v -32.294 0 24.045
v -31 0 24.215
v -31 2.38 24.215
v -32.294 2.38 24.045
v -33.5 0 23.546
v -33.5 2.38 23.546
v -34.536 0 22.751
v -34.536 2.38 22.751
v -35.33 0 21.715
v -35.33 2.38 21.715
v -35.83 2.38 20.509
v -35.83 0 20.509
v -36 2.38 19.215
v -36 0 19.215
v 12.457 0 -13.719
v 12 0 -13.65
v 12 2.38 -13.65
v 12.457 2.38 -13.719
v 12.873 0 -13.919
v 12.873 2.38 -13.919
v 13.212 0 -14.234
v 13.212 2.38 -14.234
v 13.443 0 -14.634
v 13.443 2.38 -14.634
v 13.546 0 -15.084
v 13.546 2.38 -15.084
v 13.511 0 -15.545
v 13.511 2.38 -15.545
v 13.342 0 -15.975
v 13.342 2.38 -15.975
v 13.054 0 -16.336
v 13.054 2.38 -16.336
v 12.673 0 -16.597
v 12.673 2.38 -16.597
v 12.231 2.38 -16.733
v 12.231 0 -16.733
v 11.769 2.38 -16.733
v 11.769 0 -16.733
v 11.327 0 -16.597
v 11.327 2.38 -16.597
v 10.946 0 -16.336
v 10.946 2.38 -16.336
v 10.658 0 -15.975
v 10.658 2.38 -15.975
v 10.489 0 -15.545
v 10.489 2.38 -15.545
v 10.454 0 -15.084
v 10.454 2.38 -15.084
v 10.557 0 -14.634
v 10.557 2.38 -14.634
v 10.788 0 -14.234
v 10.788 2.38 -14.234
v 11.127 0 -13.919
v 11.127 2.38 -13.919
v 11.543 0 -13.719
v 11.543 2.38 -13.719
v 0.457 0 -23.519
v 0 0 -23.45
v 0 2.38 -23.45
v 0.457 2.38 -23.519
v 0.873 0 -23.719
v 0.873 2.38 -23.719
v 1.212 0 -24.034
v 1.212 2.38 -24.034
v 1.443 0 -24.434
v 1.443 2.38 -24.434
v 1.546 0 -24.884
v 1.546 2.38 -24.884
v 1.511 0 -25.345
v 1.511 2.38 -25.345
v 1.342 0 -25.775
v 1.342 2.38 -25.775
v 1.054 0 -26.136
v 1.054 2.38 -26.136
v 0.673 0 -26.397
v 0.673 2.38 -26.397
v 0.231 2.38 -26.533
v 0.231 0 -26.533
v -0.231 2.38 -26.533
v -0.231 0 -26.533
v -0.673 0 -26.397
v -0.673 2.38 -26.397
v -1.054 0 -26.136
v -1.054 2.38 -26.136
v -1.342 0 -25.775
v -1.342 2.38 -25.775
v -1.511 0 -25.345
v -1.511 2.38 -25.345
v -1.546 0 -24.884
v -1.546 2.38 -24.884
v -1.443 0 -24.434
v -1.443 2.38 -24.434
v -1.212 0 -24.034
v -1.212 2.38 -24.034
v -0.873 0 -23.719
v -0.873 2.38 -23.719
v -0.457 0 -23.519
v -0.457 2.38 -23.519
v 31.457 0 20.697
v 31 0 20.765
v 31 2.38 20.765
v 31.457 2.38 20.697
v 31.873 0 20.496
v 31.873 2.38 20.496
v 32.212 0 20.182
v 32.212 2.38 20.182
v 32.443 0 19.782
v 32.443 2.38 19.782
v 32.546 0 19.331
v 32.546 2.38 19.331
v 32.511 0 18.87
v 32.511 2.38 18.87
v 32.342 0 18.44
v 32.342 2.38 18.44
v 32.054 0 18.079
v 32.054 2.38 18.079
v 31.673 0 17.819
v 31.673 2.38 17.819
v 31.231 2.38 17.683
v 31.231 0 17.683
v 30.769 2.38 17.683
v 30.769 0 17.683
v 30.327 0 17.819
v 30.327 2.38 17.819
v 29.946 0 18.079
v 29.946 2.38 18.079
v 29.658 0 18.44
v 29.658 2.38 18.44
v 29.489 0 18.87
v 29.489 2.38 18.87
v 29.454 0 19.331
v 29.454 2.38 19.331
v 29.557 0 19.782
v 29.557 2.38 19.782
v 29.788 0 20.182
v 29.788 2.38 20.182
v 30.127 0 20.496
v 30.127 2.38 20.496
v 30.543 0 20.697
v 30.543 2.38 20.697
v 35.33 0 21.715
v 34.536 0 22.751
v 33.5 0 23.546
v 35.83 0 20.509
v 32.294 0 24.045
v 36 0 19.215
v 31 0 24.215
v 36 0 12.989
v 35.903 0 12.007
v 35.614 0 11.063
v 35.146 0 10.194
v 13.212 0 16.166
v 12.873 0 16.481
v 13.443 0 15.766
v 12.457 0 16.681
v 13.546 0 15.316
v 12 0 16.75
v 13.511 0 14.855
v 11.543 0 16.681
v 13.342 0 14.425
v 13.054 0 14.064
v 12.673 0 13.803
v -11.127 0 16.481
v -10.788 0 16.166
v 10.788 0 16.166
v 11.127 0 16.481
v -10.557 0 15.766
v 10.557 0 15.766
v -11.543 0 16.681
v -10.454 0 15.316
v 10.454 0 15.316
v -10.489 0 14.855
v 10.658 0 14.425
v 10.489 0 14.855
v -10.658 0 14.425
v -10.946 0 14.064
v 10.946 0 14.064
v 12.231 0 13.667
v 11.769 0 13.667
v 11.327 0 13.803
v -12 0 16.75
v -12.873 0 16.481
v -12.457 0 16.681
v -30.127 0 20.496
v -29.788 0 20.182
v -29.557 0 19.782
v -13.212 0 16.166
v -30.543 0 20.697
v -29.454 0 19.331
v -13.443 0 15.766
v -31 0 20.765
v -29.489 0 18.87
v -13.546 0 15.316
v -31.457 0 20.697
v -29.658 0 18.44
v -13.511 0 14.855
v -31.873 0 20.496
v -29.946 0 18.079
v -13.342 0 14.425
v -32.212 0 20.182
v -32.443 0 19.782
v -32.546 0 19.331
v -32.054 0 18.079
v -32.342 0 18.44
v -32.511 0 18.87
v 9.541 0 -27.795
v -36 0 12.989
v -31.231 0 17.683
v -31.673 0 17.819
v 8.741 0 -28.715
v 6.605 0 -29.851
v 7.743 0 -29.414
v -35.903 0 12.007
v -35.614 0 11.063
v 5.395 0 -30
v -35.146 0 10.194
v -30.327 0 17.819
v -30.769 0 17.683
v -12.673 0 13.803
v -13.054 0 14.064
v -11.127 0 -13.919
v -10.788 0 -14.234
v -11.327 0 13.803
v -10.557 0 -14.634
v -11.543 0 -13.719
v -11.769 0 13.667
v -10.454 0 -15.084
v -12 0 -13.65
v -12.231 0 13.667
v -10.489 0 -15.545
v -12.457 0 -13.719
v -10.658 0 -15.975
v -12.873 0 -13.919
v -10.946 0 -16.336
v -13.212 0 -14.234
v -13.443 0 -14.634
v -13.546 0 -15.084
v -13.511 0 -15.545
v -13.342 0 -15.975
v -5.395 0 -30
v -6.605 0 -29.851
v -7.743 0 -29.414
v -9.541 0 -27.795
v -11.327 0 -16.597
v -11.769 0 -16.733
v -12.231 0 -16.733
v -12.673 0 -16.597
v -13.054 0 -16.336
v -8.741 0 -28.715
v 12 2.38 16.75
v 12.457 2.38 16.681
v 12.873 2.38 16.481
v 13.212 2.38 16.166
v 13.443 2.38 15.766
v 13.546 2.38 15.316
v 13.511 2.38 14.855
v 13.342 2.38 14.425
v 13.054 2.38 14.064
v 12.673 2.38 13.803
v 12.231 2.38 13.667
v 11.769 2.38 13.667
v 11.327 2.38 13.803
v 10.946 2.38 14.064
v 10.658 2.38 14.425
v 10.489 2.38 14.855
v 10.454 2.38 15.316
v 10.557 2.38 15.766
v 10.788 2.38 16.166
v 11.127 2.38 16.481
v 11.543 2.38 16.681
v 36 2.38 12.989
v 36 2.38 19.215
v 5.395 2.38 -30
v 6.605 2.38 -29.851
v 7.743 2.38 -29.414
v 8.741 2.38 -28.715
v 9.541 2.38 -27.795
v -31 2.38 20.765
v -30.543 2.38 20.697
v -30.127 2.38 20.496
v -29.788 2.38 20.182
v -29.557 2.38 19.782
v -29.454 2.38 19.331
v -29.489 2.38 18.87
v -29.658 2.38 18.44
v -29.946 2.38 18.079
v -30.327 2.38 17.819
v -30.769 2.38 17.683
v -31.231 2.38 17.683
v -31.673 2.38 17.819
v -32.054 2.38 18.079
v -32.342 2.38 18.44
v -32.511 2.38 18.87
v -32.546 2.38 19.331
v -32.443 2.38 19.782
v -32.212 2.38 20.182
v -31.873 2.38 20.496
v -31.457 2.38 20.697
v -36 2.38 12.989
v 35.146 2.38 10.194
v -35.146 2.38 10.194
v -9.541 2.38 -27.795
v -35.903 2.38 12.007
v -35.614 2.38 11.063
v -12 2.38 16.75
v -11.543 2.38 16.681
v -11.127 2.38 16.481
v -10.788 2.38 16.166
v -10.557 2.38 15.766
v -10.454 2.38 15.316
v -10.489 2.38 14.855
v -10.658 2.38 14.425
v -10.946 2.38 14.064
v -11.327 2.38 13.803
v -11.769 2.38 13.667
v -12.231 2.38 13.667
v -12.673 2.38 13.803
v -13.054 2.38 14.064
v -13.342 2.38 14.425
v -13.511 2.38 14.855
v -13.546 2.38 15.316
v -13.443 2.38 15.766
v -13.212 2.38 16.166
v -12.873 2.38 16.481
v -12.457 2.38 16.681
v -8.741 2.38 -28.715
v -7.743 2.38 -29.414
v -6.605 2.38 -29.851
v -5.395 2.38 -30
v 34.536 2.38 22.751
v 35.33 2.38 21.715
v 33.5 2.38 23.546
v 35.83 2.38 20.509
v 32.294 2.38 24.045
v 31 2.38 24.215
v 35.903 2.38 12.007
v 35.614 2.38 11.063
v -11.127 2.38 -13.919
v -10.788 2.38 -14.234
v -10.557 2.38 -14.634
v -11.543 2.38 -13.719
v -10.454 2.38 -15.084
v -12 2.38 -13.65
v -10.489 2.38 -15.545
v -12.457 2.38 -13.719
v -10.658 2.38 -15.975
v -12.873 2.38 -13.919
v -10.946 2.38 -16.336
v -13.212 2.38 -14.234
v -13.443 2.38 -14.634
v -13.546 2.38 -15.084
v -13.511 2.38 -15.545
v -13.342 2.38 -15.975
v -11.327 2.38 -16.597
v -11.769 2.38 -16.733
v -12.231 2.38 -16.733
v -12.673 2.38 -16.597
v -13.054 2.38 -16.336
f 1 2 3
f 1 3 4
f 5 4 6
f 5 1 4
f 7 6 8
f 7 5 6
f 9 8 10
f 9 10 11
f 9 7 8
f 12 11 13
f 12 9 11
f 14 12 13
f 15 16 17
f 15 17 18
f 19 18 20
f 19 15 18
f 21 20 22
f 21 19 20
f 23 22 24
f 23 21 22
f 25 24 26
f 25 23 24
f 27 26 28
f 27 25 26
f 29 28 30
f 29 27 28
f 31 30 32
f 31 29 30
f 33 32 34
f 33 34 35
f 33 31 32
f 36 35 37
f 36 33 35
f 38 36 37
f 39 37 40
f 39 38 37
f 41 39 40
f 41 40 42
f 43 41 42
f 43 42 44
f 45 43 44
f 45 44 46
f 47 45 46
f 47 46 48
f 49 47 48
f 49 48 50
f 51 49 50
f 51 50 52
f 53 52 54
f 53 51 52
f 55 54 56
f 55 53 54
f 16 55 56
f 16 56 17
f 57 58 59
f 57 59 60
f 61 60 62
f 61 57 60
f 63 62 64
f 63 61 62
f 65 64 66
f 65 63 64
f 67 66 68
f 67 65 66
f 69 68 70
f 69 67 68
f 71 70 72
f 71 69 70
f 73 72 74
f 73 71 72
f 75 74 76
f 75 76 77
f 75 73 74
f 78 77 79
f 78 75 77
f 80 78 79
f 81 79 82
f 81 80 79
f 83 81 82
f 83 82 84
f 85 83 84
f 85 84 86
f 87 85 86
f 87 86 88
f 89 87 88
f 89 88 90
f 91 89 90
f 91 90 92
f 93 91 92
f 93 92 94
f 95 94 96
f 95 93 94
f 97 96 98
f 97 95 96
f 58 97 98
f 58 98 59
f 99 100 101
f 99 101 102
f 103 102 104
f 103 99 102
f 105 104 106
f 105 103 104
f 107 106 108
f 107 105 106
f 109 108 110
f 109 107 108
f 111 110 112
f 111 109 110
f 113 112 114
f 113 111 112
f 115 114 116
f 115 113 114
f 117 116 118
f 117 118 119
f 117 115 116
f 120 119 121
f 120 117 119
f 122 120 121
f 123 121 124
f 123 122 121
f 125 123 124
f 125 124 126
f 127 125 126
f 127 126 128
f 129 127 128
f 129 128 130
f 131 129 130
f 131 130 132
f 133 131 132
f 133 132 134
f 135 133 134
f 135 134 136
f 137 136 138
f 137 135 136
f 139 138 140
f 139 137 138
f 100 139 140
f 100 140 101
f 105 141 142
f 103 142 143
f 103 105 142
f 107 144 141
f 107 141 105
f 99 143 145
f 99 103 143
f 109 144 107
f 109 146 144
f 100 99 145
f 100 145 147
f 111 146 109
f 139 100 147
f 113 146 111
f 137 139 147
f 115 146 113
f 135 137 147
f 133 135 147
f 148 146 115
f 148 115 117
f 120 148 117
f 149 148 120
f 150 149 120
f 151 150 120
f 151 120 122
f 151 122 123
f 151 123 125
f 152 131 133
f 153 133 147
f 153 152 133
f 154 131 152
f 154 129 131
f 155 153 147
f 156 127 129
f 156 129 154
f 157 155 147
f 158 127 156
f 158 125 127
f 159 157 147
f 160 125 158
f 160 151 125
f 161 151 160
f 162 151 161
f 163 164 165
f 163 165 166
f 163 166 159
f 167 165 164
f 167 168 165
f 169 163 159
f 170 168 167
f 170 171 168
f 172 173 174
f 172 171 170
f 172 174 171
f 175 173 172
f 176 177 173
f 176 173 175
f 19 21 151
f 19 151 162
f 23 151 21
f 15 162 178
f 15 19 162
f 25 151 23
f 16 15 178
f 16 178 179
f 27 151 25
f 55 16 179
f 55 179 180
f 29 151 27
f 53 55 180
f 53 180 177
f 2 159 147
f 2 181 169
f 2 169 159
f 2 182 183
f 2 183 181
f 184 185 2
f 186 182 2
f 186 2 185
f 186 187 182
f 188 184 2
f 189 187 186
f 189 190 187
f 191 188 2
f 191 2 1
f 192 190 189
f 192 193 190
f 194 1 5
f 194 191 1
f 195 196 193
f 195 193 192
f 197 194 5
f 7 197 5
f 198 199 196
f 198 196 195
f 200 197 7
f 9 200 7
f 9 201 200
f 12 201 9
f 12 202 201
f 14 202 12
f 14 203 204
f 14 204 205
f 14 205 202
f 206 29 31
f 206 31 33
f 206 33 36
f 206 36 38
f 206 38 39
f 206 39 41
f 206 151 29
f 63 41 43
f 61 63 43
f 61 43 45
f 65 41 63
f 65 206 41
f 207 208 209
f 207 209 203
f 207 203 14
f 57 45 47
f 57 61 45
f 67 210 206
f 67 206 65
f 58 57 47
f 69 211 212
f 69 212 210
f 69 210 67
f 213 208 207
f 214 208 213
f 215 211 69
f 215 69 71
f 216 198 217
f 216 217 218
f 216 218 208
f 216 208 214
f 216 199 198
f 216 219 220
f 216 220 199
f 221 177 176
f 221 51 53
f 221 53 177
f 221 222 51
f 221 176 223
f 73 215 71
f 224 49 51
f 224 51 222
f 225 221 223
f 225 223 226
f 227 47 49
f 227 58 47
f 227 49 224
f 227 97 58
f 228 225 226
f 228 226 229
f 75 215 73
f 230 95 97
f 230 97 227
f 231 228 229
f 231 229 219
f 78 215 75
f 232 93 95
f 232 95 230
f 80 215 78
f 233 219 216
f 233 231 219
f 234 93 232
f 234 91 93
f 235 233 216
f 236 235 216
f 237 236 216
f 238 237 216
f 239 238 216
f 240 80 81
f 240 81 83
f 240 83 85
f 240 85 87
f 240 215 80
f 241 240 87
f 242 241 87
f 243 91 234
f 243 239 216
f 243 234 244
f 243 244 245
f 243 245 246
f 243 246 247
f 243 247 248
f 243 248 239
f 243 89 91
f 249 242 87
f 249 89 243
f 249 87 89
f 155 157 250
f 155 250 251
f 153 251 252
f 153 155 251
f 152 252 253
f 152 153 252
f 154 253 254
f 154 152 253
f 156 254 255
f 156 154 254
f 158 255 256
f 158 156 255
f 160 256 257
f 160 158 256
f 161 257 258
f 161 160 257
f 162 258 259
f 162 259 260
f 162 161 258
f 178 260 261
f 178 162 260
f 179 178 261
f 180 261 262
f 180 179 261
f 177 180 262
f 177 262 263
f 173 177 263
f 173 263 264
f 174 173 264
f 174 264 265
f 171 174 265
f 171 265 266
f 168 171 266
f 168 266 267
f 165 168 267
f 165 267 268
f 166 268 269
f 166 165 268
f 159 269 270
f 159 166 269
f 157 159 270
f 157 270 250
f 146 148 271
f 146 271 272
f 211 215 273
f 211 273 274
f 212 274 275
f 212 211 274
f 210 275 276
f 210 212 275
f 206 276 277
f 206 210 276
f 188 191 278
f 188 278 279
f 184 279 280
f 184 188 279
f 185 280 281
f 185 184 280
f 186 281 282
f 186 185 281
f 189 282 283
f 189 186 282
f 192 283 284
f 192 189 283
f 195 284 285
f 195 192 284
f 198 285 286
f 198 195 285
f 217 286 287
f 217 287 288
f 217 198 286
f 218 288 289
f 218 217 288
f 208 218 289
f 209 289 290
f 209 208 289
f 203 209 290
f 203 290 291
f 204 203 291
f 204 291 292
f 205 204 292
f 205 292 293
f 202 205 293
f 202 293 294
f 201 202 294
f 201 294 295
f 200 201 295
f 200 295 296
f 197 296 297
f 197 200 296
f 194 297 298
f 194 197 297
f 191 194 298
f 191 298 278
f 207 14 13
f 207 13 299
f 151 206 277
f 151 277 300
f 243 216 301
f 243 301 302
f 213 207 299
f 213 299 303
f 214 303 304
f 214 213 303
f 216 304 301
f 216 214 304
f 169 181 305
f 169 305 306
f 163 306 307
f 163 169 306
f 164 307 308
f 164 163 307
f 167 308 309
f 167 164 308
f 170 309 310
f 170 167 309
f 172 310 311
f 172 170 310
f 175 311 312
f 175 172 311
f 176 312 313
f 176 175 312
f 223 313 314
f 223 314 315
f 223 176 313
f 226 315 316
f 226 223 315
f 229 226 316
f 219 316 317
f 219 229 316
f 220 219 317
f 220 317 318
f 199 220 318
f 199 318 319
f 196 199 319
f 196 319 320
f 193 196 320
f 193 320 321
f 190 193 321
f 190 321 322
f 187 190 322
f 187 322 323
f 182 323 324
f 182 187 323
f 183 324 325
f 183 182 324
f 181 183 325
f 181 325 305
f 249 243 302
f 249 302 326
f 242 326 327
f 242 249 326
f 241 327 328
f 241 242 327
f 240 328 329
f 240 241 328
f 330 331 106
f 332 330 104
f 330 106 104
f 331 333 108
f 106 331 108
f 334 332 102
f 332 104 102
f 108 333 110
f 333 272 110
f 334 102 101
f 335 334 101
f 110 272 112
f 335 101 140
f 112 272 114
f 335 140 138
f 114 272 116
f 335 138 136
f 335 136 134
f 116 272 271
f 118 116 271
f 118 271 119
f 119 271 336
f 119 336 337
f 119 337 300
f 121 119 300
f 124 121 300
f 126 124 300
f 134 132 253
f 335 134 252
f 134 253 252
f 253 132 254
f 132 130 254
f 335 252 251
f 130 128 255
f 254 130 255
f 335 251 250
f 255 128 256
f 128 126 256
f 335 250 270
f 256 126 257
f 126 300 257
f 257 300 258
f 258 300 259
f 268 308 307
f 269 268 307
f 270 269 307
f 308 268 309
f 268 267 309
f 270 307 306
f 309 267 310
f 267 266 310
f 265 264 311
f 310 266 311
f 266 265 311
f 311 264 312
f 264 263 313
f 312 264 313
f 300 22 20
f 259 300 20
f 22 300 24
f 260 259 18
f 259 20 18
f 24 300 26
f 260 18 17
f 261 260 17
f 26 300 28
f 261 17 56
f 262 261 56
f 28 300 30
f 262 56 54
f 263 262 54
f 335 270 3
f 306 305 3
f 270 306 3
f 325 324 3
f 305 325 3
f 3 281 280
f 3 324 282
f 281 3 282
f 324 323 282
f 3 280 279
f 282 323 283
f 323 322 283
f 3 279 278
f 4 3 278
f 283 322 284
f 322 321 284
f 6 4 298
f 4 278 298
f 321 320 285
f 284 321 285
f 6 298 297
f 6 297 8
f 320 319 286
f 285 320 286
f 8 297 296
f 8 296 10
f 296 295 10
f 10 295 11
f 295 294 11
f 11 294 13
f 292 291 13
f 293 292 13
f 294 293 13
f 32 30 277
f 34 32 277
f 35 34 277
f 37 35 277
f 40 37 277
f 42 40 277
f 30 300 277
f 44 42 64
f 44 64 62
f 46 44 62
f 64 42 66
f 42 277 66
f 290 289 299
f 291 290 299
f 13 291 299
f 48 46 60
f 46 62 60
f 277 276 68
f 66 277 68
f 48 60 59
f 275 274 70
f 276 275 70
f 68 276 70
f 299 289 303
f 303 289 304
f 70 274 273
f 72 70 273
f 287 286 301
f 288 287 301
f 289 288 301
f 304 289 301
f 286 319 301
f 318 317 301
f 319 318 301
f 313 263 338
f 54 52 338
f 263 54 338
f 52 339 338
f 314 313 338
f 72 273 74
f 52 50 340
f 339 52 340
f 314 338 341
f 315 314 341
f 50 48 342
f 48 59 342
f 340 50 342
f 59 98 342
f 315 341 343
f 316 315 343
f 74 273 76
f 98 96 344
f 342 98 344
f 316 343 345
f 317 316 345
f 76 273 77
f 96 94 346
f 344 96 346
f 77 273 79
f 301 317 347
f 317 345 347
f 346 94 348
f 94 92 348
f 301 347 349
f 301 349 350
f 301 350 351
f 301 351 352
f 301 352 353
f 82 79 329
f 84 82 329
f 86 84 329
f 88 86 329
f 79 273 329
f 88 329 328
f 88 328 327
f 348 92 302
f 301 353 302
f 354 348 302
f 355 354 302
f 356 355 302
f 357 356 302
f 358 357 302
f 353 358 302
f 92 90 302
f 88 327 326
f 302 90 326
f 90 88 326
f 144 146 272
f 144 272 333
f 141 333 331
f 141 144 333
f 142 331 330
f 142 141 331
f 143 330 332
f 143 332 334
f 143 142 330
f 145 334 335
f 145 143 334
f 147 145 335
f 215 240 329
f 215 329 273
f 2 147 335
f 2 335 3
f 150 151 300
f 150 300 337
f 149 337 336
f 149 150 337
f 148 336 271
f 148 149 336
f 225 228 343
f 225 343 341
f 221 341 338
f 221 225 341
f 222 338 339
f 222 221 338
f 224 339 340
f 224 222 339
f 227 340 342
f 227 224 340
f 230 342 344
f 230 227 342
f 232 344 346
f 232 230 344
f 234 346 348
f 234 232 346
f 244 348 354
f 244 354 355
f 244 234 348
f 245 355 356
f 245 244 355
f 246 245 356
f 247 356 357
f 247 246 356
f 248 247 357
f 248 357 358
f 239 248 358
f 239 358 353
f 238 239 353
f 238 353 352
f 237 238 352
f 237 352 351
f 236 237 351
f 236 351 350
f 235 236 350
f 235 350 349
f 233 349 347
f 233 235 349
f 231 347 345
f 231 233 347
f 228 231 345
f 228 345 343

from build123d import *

# Parameters (mm, degrees)
SKETCH1_R           = 1.55
BOSS_EXTRUDE1_DEPTH = 2.38


with BuildPart() as part:
    # Sketch1 → Boss-Extrude1 (new body)
    with BuildSketch(Plane(origin=(0, 0, 0), x_dir=(1, 0, 0), z_dir=(0, 1, 0))):
        with BuildLine():
            Line((-5.394574785, 30), (5.394574785, 30))
            ThreePointArc((5.394574785, 30), (7.742669354, 29.414346146), (9.54069567, 27.794580758))
            Line((9.54069567, 27.794580758), (35.146120884, -10.194369075))
            ThreePointArc((35.146120884, -10.194369075), (35.781767687, -11.527889331), (36, -12.988949833))
            Line((36, -12.988949833), (36, -19.215381939))
            ThreePointArc((36, -19.215381939), (34.535533906, -22.750915845), (31, -24.215381939))
            Line((31, -24.215381939), (-31, -24.215381939))
            ThreePointArc((-31, -24.215381939), (-34.535533906, -22.750915845), (-36, -19.215381939))
            Line((-36, -19.215381939), (-36, -12.988949833))
            ThreePointArc((-36, -12.988949833), (-35.781767687, -11.527889331), (-35.146120884, -10.194369075))
            Line((-35.146120884, -10.194369075), (-9.54069567, 27.794580758))
            ThreePointArc((-9.54069567, 27.794580758), (-7.742669354, 29.414346146), (-5.394574785, 30))
        make_face()
        with Locations(Location((0, 25, 0), (0, 0, 270))):
            Circle(SKETCH1_R, mode=Mode.SUBTRACT)
        with Locations(Location((-31, -19.215381939, 0), (0, 0, 270))):
            Circle(SKETCH1_R, mode=Mode.SUBTRACT)
        with Locations(Location((31, -19.215381939, 0), (0, 0, 270))):
            Circle(SKETCH1_R, mode=Mode.SUBTRACT)
        with Locations(Location((12, -15.2, 0), (0, 0, 270))):
            Circle(SKETCH1_R, mode=Mode.SUBTRACT)
        with Locations(Location((-12, -15.2, 0), (0, 0, 270))):
            Circle(SKETCH1_R, mode=Mode.SUBTRACT)
        with Locations(Location((-12, 15.2, 0), (0, 0, 270))):
            Circle(SKETCH1_R, mode=Mode.SUBTRACT)
        with Locations(Location((12, 15.2, 0), (0, 0, 270))):
            Circle(SKETCH1_R, mode=Mode.SUBTRACT)
    extrude(amount=BOSS_EXTRUDE1_DEPTH)


solid = part.part
